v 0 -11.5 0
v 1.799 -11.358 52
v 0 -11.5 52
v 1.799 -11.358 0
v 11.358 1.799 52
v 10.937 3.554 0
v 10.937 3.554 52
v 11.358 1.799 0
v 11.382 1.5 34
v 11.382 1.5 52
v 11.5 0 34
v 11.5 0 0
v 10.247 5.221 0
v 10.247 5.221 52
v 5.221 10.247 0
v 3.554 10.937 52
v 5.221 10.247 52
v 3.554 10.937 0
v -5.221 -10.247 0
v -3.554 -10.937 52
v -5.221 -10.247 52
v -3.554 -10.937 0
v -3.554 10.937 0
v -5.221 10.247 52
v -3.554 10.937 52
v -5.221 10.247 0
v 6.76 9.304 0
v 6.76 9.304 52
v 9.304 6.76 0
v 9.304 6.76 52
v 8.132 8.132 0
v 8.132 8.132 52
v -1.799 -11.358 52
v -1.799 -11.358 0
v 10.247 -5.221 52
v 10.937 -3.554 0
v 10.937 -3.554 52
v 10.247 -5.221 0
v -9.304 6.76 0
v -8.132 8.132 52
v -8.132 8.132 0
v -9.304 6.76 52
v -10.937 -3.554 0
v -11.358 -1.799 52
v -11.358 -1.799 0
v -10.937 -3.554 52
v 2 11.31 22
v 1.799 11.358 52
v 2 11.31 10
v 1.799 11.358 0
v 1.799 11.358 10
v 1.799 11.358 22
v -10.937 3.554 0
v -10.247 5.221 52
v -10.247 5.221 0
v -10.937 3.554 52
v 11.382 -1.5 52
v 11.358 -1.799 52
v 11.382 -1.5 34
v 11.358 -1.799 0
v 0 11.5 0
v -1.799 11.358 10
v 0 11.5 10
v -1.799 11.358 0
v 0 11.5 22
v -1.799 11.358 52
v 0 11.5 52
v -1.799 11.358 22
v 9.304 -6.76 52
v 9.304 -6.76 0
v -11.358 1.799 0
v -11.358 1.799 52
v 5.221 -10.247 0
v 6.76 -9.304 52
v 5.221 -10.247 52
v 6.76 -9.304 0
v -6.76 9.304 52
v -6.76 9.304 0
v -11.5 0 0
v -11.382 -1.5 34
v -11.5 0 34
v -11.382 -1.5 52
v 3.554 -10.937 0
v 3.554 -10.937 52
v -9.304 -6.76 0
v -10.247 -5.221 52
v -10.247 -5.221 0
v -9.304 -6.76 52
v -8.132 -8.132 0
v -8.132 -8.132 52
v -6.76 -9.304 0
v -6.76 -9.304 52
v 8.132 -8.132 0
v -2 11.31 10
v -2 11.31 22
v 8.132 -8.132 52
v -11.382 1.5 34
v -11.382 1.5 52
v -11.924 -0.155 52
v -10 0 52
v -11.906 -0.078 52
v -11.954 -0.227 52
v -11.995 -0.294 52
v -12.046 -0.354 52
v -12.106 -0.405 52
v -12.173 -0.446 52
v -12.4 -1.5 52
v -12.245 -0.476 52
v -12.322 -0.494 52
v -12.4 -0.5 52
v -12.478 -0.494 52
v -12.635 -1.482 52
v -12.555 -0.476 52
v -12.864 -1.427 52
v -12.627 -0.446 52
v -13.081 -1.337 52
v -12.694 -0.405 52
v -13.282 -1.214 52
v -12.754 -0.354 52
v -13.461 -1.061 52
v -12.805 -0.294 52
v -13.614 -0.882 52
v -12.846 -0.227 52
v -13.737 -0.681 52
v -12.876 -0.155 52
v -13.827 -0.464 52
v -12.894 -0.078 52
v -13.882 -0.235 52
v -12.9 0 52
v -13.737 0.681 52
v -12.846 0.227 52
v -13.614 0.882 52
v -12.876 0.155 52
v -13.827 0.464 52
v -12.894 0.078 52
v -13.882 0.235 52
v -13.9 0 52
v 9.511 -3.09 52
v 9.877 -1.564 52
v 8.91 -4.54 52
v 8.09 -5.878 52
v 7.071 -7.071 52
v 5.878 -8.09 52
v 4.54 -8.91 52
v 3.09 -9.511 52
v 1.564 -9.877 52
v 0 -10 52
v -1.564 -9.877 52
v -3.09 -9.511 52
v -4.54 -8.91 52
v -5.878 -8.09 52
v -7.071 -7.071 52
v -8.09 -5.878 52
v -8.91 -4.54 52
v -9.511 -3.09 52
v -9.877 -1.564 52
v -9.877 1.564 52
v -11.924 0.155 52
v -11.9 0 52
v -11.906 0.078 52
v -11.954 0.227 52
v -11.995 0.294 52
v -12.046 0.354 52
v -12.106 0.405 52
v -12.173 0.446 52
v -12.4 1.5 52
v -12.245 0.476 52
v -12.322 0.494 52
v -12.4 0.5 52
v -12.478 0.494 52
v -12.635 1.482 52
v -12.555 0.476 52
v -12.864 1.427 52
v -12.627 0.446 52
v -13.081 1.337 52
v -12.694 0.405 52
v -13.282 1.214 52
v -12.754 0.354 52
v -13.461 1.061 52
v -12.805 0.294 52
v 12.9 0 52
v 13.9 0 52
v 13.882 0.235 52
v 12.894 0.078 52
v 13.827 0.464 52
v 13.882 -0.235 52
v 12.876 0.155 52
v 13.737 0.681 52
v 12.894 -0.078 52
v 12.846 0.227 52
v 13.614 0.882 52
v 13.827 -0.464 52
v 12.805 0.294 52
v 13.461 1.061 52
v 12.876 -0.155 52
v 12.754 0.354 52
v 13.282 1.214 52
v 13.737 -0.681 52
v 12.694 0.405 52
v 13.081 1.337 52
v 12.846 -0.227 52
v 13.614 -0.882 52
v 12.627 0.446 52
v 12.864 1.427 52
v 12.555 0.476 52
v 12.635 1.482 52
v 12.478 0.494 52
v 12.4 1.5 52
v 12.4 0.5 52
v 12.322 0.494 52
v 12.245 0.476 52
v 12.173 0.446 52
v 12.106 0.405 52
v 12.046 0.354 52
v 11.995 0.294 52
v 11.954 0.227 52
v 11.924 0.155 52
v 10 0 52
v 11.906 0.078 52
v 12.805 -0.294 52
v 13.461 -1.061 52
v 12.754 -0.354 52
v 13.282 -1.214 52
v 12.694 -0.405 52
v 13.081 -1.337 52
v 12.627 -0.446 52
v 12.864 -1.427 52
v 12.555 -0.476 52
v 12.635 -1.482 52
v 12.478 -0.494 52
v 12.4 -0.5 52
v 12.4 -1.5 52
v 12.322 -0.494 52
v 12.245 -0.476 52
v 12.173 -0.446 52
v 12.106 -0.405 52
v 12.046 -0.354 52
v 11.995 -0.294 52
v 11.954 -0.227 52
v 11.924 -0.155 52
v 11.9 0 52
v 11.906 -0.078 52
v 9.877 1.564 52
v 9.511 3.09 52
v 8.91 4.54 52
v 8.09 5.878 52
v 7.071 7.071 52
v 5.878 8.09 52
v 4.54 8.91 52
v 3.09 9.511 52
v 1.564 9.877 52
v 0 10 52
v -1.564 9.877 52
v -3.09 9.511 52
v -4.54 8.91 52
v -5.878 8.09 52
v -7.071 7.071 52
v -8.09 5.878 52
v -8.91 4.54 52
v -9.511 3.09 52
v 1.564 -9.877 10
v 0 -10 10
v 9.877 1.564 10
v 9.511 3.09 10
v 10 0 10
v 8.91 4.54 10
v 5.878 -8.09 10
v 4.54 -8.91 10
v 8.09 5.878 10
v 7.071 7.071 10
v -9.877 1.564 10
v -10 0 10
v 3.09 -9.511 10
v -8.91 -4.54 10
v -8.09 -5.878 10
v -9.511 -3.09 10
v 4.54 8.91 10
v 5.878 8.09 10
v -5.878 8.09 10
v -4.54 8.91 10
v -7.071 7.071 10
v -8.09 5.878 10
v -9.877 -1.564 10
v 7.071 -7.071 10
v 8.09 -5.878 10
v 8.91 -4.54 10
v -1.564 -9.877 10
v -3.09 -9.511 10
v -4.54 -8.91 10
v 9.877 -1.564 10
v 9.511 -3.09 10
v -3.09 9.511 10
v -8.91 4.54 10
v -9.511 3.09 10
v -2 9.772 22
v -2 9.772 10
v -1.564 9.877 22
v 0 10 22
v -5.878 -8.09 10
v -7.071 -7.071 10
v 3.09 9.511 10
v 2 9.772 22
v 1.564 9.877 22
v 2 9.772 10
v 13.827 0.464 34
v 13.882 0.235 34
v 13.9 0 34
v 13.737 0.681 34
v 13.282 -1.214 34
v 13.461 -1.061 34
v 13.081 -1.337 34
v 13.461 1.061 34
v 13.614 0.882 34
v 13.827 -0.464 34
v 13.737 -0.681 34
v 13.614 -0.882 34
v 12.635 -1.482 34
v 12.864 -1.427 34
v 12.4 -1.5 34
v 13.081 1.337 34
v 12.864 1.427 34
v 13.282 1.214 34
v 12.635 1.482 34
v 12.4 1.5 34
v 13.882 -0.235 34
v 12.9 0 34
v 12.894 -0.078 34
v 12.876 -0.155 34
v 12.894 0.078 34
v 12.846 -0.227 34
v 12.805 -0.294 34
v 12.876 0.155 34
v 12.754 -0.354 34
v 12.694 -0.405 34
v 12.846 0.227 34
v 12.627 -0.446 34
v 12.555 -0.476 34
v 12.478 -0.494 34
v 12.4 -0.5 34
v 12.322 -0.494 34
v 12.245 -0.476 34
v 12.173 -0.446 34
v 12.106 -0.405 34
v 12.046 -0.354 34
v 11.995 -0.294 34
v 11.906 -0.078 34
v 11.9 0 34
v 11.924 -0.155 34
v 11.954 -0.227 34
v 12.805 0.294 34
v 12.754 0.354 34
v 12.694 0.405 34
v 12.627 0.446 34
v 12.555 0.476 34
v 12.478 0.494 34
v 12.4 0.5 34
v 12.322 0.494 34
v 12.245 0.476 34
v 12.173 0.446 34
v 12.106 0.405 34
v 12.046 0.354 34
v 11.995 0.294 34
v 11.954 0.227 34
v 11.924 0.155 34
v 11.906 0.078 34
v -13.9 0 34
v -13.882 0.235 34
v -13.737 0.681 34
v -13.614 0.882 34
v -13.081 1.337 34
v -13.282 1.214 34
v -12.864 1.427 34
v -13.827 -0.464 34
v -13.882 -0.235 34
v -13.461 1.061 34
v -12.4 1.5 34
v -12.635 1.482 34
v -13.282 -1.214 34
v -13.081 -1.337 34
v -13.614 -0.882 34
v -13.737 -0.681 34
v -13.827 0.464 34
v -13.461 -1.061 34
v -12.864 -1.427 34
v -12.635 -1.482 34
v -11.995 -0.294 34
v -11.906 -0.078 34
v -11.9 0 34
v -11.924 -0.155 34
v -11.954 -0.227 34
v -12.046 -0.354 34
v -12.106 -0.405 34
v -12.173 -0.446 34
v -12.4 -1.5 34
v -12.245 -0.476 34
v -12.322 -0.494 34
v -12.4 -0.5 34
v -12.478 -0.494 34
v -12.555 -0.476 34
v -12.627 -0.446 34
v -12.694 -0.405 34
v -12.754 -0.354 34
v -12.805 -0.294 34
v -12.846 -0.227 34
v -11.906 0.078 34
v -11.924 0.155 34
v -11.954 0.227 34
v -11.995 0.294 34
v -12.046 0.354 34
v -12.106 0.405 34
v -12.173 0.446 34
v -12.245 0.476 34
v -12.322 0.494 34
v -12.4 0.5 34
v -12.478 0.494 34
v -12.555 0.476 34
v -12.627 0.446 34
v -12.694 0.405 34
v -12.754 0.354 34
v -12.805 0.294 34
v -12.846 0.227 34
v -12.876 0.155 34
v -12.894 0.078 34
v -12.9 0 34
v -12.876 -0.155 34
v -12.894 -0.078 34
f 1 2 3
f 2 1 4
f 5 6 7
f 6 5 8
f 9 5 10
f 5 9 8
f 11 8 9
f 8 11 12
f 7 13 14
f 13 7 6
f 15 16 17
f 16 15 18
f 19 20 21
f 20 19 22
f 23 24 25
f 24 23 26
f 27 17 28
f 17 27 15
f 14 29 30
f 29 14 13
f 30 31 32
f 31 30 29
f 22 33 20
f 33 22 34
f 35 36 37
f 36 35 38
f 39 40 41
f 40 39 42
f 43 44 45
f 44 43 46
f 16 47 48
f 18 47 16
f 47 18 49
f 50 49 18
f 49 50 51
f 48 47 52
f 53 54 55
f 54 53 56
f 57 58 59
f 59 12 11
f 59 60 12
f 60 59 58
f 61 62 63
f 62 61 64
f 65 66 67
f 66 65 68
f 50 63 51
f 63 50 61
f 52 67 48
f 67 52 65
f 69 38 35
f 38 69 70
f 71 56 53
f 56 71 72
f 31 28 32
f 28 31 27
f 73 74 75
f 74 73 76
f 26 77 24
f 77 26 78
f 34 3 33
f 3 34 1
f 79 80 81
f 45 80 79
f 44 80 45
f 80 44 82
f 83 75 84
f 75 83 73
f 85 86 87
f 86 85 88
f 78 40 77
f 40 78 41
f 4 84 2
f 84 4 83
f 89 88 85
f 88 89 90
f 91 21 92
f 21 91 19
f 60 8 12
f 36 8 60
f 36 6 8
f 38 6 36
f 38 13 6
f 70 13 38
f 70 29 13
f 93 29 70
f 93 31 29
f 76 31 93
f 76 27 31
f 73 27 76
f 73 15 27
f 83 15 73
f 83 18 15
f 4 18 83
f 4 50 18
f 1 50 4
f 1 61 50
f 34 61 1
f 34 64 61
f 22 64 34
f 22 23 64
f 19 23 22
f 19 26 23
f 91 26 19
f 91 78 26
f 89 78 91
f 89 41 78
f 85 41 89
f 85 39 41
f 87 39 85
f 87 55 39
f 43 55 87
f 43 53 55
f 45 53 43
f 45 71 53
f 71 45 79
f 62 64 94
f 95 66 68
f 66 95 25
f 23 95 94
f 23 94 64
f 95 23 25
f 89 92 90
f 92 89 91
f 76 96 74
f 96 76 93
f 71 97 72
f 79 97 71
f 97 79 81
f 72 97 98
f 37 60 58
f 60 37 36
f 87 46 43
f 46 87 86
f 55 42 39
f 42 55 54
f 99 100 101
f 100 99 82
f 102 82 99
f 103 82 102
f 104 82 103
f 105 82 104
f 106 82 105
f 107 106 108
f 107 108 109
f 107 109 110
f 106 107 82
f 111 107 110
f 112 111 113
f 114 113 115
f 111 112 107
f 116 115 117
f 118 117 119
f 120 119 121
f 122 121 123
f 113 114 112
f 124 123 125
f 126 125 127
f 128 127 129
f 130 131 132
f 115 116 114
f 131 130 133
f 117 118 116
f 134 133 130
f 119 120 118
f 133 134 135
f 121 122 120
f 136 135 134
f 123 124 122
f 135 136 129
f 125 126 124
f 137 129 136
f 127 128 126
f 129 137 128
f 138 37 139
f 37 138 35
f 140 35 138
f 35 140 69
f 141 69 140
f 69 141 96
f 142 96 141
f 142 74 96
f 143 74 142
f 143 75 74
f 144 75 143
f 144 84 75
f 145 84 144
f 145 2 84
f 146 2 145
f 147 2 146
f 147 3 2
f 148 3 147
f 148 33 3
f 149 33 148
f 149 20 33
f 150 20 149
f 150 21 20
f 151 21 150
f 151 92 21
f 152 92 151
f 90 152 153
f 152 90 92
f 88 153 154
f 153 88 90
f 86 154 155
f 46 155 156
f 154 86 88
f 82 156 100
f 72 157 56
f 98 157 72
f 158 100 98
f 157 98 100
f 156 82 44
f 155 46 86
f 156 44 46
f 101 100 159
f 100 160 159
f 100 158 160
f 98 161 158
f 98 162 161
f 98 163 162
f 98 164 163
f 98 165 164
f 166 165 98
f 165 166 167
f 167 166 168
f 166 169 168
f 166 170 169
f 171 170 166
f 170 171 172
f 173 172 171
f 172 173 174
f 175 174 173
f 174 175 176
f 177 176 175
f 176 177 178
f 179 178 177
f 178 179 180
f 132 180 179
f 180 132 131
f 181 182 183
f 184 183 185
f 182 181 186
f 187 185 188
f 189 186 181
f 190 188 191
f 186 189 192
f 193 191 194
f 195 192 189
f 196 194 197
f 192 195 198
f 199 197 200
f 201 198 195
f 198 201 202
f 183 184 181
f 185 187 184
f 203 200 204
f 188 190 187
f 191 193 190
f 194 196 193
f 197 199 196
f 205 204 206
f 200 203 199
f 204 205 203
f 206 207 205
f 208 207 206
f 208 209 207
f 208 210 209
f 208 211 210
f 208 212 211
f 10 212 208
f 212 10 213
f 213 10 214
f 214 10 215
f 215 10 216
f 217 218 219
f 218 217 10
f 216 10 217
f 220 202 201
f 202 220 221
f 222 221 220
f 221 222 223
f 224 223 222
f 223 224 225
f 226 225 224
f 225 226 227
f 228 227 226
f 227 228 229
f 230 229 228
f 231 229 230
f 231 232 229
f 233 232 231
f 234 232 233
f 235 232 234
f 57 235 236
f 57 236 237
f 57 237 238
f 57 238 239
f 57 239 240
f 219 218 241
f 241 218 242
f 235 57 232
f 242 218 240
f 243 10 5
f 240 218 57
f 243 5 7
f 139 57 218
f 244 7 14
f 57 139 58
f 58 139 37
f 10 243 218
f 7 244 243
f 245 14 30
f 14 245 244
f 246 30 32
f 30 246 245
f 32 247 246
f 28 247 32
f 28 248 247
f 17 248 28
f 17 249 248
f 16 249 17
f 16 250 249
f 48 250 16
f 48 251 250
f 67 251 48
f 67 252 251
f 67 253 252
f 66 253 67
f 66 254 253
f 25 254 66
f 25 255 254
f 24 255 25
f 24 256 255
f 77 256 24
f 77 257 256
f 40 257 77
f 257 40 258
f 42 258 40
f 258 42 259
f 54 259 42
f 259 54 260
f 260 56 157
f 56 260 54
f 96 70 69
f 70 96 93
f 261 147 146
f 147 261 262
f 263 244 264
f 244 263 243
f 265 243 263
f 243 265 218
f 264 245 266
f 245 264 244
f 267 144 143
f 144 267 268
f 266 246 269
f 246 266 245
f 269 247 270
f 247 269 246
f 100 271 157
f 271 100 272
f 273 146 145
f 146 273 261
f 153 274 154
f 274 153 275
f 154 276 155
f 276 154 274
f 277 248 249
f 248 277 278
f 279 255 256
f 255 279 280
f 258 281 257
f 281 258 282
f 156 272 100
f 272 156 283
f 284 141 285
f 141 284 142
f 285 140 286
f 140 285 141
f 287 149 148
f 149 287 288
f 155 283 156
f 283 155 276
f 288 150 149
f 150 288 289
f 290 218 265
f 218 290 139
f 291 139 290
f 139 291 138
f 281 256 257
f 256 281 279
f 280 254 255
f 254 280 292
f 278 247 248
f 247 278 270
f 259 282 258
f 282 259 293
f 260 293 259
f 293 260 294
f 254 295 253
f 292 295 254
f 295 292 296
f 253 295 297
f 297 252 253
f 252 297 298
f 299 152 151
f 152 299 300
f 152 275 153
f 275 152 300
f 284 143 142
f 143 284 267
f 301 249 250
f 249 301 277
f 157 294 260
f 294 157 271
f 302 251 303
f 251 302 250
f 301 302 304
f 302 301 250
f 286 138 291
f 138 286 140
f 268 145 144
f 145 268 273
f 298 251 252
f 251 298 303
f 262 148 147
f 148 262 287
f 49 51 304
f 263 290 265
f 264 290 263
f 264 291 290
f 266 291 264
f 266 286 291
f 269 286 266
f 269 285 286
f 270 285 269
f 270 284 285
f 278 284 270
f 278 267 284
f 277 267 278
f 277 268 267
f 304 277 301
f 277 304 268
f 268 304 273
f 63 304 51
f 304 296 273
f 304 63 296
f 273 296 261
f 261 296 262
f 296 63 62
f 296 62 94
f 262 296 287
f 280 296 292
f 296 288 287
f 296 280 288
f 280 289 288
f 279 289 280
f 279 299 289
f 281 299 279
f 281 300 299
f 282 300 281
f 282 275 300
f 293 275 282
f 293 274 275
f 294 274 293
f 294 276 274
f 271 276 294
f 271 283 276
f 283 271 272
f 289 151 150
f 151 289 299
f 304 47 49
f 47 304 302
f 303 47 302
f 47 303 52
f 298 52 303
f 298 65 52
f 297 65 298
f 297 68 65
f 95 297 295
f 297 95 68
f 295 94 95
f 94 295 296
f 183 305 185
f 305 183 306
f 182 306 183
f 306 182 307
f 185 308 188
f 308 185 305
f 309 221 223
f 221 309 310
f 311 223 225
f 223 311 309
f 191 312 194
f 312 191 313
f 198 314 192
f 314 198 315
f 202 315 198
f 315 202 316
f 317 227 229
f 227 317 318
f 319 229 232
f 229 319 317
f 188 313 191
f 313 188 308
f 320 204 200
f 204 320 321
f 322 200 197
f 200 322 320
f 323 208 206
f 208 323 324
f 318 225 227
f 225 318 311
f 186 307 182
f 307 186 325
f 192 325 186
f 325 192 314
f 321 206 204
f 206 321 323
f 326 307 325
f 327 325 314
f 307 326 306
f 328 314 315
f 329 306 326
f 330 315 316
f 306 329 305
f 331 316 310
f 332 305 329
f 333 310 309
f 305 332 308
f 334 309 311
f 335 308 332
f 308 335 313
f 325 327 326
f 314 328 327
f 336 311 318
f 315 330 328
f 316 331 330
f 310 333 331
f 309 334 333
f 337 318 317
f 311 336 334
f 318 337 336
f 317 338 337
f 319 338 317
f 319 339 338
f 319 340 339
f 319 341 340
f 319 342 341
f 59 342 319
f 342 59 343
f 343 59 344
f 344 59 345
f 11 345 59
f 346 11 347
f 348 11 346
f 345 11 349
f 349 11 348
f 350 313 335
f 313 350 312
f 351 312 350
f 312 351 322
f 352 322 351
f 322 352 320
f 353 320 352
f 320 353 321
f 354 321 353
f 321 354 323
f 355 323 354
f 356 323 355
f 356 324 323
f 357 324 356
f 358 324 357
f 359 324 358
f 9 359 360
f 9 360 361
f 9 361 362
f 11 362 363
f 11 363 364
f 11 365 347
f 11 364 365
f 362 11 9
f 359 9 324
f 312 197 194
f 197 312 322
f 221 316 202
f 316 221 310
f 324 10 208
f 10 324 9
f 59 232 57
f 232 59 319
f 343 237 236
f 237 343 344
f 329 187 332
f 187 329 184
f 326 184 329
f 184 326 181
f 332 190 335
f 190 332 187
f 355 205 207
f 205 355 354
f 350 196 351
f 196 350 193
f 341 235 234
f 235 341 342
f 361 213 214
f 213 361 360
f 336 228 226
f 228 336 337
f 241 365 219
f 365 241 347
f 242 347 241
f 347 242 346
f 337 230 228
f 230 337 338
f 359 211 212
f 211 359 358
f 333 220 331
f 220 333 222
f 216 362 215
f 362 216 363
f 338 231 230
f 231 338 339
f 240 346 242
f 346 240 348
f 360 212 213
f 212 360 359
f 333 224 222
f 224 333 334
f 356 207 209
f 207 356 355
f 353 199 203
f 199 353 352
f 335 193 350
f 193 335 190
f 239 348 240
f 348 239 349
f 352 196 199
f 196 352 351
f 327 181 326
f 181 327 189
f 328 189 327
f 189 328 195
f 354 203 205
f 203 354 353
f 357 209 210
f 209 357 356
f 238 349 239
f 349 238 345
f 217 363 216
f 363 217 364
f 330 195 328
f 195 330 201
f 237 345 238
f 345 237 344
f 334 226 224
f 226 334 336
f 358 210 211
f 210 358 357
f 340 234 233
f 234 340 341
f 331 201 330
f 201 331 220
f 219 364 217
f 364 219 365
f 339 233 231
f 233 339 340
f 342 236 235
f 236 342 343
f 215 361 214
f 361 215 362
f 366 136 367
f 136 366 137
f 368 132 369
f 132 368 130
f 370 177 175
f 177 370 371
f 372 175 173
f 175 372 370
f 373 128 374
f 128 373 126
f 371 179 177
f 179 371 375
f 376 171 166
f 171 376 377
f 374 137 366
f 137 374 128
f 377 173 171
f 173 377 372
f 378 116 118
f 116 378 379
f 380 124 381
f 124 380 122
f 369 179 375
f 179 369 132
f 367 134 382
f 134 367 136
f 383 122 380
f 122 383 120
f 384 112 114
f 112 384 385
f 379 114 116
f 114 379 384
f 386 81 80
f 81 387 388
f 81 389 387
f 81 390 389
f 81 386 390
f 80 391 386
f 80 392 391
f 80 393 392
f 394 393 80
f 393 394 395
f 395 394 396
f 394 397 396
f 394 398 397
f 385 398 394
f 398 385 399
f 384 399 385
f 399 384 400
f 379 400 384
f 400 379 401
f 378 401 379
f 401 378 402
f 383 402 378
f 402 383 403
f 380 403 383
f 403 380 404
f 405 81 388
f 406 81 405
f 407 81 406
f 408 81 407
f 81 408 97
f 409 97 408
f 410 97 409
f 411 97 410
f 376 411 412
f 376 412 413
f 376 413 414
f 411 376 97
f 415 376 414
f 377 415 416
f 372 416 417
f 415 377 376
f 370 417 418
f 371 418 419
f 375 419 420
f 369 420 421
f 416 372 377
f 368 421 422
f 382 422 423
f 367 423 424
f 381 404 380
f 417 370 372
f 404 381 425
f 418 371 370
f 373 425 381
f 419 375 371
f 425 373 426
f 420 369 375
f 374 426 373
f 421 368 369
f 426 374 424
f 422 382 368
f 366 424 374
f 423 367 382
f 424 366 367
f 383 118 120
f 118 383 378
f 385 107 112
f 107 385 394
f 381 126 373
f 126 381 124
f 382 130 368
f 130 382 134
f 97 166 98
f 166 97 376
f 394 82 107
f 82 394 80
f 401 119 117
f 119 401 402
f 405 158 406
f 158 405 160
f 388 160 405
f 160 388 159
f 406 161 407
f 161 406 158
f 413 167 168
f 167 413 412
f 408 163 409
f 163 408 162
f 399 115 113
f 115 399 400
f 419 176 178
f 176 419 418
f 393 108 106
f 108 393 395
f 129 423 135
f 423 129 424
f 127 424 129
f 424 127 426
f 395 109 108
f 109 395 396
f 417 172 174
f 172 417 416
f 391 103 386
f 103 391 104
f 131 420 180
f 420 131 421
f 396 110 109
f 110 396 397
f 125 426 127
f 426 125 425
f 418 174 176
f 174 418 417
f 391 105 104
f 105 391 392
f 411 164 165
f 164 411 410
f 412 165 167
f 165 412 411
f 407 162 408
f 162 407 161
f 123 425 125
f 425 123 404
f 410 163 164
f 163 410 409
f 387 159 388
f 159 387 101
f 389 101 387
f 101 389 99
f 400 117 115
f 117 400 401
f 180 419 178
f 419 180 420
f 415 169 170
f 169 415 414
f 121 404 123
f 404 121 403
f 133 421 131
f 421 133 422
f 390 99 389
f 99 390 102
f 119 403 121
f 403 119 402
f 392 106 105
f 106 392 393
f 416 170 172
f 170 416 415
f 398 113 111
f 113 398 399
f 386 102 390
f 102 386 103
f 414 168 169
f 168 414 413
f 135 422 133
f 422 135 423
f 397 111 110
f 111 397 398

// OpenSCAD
$fn=40;
hitter();
//plate();


module plate(){
difference(){
union(){cube([20,40,4.5]);
translate([10,0,0])cylinder(d=20,h=4.5);
    translate([0,13,4.5])cube([5,4,2.5]);
}
translate([10,0,0])cylinder(d=15,h=4.5);
translate([10,15,0])cylinder(d=5,h=4.5);
translate([10,30,0])cylinder(d=5.5,h=4.5);
translate([0.75,14.25,0])cube([3.5,1.5,8]);
}
}
module plate_small(){
difference(){
union(){cube([15,32.5,3]);
translate([7.5,0,0])cylinder(d=15,h=3);
    translate([0,13,3])cube([5,4,2.5]);
}
translate([7.5,0,0])cylinder(d=10,h=3);
translate([7.5,15,0])cylinder(d=5,h=3);
translate([7.5,25,0])cylinder(d=5.5,h=3);
translate([0.75,14.25,0])cube([3.5,1.5,6]);
}
}
module hitter(){
translate([0,-0,0]){difference(){
    cylinder(d=23,h=52);
    translate([0,0,10])cylinder(d=20,h=42.1);
    translate([-2,0,10])cube([4,20,12]);
}
translate([12.4,0,34]){
    
    difference(){
        union(){
            cylinder(d=3,h=18);
            translate([-1.5,-1.5,0])cube([1.5,3,18]);
        }
        cylinder(d=1,h=18);
    }

}
translate([-12.4,0,34]){
    
    difference(){
        union(){
            cylinder(d=3,h=18);
            translate([0,-1.5,0])cube([1.5,3,18]);
        }
        cylinder(d=1,h=18);
    }

}

}
}

module hitter_small(){
translate([0,-20,0]){difference(){
    cylinder(d=15,h=38);
    translate([0,0,10])cylinder(d=13.3,h=28.1);
    translate([-1.5,0,10])cube([3,10,10]);
}
translate([8.2,0,20]){
    
    difference(){
        union(){
            cylinder(d=3,h=18);
            translate([-1.5,-1.5,0])cube([1.5,3,18]);
        }
        cylinder(d=1,h=18);
    }

}
translate([-8.2,0,20]){
    
    difference(){
        union(){
            cylinder(d=3,h=18);
            translate([0,-1.5,0])cube([1.5,3,18]);
        }
        cylinder(d=1,h=18);
    }

}

}
}
